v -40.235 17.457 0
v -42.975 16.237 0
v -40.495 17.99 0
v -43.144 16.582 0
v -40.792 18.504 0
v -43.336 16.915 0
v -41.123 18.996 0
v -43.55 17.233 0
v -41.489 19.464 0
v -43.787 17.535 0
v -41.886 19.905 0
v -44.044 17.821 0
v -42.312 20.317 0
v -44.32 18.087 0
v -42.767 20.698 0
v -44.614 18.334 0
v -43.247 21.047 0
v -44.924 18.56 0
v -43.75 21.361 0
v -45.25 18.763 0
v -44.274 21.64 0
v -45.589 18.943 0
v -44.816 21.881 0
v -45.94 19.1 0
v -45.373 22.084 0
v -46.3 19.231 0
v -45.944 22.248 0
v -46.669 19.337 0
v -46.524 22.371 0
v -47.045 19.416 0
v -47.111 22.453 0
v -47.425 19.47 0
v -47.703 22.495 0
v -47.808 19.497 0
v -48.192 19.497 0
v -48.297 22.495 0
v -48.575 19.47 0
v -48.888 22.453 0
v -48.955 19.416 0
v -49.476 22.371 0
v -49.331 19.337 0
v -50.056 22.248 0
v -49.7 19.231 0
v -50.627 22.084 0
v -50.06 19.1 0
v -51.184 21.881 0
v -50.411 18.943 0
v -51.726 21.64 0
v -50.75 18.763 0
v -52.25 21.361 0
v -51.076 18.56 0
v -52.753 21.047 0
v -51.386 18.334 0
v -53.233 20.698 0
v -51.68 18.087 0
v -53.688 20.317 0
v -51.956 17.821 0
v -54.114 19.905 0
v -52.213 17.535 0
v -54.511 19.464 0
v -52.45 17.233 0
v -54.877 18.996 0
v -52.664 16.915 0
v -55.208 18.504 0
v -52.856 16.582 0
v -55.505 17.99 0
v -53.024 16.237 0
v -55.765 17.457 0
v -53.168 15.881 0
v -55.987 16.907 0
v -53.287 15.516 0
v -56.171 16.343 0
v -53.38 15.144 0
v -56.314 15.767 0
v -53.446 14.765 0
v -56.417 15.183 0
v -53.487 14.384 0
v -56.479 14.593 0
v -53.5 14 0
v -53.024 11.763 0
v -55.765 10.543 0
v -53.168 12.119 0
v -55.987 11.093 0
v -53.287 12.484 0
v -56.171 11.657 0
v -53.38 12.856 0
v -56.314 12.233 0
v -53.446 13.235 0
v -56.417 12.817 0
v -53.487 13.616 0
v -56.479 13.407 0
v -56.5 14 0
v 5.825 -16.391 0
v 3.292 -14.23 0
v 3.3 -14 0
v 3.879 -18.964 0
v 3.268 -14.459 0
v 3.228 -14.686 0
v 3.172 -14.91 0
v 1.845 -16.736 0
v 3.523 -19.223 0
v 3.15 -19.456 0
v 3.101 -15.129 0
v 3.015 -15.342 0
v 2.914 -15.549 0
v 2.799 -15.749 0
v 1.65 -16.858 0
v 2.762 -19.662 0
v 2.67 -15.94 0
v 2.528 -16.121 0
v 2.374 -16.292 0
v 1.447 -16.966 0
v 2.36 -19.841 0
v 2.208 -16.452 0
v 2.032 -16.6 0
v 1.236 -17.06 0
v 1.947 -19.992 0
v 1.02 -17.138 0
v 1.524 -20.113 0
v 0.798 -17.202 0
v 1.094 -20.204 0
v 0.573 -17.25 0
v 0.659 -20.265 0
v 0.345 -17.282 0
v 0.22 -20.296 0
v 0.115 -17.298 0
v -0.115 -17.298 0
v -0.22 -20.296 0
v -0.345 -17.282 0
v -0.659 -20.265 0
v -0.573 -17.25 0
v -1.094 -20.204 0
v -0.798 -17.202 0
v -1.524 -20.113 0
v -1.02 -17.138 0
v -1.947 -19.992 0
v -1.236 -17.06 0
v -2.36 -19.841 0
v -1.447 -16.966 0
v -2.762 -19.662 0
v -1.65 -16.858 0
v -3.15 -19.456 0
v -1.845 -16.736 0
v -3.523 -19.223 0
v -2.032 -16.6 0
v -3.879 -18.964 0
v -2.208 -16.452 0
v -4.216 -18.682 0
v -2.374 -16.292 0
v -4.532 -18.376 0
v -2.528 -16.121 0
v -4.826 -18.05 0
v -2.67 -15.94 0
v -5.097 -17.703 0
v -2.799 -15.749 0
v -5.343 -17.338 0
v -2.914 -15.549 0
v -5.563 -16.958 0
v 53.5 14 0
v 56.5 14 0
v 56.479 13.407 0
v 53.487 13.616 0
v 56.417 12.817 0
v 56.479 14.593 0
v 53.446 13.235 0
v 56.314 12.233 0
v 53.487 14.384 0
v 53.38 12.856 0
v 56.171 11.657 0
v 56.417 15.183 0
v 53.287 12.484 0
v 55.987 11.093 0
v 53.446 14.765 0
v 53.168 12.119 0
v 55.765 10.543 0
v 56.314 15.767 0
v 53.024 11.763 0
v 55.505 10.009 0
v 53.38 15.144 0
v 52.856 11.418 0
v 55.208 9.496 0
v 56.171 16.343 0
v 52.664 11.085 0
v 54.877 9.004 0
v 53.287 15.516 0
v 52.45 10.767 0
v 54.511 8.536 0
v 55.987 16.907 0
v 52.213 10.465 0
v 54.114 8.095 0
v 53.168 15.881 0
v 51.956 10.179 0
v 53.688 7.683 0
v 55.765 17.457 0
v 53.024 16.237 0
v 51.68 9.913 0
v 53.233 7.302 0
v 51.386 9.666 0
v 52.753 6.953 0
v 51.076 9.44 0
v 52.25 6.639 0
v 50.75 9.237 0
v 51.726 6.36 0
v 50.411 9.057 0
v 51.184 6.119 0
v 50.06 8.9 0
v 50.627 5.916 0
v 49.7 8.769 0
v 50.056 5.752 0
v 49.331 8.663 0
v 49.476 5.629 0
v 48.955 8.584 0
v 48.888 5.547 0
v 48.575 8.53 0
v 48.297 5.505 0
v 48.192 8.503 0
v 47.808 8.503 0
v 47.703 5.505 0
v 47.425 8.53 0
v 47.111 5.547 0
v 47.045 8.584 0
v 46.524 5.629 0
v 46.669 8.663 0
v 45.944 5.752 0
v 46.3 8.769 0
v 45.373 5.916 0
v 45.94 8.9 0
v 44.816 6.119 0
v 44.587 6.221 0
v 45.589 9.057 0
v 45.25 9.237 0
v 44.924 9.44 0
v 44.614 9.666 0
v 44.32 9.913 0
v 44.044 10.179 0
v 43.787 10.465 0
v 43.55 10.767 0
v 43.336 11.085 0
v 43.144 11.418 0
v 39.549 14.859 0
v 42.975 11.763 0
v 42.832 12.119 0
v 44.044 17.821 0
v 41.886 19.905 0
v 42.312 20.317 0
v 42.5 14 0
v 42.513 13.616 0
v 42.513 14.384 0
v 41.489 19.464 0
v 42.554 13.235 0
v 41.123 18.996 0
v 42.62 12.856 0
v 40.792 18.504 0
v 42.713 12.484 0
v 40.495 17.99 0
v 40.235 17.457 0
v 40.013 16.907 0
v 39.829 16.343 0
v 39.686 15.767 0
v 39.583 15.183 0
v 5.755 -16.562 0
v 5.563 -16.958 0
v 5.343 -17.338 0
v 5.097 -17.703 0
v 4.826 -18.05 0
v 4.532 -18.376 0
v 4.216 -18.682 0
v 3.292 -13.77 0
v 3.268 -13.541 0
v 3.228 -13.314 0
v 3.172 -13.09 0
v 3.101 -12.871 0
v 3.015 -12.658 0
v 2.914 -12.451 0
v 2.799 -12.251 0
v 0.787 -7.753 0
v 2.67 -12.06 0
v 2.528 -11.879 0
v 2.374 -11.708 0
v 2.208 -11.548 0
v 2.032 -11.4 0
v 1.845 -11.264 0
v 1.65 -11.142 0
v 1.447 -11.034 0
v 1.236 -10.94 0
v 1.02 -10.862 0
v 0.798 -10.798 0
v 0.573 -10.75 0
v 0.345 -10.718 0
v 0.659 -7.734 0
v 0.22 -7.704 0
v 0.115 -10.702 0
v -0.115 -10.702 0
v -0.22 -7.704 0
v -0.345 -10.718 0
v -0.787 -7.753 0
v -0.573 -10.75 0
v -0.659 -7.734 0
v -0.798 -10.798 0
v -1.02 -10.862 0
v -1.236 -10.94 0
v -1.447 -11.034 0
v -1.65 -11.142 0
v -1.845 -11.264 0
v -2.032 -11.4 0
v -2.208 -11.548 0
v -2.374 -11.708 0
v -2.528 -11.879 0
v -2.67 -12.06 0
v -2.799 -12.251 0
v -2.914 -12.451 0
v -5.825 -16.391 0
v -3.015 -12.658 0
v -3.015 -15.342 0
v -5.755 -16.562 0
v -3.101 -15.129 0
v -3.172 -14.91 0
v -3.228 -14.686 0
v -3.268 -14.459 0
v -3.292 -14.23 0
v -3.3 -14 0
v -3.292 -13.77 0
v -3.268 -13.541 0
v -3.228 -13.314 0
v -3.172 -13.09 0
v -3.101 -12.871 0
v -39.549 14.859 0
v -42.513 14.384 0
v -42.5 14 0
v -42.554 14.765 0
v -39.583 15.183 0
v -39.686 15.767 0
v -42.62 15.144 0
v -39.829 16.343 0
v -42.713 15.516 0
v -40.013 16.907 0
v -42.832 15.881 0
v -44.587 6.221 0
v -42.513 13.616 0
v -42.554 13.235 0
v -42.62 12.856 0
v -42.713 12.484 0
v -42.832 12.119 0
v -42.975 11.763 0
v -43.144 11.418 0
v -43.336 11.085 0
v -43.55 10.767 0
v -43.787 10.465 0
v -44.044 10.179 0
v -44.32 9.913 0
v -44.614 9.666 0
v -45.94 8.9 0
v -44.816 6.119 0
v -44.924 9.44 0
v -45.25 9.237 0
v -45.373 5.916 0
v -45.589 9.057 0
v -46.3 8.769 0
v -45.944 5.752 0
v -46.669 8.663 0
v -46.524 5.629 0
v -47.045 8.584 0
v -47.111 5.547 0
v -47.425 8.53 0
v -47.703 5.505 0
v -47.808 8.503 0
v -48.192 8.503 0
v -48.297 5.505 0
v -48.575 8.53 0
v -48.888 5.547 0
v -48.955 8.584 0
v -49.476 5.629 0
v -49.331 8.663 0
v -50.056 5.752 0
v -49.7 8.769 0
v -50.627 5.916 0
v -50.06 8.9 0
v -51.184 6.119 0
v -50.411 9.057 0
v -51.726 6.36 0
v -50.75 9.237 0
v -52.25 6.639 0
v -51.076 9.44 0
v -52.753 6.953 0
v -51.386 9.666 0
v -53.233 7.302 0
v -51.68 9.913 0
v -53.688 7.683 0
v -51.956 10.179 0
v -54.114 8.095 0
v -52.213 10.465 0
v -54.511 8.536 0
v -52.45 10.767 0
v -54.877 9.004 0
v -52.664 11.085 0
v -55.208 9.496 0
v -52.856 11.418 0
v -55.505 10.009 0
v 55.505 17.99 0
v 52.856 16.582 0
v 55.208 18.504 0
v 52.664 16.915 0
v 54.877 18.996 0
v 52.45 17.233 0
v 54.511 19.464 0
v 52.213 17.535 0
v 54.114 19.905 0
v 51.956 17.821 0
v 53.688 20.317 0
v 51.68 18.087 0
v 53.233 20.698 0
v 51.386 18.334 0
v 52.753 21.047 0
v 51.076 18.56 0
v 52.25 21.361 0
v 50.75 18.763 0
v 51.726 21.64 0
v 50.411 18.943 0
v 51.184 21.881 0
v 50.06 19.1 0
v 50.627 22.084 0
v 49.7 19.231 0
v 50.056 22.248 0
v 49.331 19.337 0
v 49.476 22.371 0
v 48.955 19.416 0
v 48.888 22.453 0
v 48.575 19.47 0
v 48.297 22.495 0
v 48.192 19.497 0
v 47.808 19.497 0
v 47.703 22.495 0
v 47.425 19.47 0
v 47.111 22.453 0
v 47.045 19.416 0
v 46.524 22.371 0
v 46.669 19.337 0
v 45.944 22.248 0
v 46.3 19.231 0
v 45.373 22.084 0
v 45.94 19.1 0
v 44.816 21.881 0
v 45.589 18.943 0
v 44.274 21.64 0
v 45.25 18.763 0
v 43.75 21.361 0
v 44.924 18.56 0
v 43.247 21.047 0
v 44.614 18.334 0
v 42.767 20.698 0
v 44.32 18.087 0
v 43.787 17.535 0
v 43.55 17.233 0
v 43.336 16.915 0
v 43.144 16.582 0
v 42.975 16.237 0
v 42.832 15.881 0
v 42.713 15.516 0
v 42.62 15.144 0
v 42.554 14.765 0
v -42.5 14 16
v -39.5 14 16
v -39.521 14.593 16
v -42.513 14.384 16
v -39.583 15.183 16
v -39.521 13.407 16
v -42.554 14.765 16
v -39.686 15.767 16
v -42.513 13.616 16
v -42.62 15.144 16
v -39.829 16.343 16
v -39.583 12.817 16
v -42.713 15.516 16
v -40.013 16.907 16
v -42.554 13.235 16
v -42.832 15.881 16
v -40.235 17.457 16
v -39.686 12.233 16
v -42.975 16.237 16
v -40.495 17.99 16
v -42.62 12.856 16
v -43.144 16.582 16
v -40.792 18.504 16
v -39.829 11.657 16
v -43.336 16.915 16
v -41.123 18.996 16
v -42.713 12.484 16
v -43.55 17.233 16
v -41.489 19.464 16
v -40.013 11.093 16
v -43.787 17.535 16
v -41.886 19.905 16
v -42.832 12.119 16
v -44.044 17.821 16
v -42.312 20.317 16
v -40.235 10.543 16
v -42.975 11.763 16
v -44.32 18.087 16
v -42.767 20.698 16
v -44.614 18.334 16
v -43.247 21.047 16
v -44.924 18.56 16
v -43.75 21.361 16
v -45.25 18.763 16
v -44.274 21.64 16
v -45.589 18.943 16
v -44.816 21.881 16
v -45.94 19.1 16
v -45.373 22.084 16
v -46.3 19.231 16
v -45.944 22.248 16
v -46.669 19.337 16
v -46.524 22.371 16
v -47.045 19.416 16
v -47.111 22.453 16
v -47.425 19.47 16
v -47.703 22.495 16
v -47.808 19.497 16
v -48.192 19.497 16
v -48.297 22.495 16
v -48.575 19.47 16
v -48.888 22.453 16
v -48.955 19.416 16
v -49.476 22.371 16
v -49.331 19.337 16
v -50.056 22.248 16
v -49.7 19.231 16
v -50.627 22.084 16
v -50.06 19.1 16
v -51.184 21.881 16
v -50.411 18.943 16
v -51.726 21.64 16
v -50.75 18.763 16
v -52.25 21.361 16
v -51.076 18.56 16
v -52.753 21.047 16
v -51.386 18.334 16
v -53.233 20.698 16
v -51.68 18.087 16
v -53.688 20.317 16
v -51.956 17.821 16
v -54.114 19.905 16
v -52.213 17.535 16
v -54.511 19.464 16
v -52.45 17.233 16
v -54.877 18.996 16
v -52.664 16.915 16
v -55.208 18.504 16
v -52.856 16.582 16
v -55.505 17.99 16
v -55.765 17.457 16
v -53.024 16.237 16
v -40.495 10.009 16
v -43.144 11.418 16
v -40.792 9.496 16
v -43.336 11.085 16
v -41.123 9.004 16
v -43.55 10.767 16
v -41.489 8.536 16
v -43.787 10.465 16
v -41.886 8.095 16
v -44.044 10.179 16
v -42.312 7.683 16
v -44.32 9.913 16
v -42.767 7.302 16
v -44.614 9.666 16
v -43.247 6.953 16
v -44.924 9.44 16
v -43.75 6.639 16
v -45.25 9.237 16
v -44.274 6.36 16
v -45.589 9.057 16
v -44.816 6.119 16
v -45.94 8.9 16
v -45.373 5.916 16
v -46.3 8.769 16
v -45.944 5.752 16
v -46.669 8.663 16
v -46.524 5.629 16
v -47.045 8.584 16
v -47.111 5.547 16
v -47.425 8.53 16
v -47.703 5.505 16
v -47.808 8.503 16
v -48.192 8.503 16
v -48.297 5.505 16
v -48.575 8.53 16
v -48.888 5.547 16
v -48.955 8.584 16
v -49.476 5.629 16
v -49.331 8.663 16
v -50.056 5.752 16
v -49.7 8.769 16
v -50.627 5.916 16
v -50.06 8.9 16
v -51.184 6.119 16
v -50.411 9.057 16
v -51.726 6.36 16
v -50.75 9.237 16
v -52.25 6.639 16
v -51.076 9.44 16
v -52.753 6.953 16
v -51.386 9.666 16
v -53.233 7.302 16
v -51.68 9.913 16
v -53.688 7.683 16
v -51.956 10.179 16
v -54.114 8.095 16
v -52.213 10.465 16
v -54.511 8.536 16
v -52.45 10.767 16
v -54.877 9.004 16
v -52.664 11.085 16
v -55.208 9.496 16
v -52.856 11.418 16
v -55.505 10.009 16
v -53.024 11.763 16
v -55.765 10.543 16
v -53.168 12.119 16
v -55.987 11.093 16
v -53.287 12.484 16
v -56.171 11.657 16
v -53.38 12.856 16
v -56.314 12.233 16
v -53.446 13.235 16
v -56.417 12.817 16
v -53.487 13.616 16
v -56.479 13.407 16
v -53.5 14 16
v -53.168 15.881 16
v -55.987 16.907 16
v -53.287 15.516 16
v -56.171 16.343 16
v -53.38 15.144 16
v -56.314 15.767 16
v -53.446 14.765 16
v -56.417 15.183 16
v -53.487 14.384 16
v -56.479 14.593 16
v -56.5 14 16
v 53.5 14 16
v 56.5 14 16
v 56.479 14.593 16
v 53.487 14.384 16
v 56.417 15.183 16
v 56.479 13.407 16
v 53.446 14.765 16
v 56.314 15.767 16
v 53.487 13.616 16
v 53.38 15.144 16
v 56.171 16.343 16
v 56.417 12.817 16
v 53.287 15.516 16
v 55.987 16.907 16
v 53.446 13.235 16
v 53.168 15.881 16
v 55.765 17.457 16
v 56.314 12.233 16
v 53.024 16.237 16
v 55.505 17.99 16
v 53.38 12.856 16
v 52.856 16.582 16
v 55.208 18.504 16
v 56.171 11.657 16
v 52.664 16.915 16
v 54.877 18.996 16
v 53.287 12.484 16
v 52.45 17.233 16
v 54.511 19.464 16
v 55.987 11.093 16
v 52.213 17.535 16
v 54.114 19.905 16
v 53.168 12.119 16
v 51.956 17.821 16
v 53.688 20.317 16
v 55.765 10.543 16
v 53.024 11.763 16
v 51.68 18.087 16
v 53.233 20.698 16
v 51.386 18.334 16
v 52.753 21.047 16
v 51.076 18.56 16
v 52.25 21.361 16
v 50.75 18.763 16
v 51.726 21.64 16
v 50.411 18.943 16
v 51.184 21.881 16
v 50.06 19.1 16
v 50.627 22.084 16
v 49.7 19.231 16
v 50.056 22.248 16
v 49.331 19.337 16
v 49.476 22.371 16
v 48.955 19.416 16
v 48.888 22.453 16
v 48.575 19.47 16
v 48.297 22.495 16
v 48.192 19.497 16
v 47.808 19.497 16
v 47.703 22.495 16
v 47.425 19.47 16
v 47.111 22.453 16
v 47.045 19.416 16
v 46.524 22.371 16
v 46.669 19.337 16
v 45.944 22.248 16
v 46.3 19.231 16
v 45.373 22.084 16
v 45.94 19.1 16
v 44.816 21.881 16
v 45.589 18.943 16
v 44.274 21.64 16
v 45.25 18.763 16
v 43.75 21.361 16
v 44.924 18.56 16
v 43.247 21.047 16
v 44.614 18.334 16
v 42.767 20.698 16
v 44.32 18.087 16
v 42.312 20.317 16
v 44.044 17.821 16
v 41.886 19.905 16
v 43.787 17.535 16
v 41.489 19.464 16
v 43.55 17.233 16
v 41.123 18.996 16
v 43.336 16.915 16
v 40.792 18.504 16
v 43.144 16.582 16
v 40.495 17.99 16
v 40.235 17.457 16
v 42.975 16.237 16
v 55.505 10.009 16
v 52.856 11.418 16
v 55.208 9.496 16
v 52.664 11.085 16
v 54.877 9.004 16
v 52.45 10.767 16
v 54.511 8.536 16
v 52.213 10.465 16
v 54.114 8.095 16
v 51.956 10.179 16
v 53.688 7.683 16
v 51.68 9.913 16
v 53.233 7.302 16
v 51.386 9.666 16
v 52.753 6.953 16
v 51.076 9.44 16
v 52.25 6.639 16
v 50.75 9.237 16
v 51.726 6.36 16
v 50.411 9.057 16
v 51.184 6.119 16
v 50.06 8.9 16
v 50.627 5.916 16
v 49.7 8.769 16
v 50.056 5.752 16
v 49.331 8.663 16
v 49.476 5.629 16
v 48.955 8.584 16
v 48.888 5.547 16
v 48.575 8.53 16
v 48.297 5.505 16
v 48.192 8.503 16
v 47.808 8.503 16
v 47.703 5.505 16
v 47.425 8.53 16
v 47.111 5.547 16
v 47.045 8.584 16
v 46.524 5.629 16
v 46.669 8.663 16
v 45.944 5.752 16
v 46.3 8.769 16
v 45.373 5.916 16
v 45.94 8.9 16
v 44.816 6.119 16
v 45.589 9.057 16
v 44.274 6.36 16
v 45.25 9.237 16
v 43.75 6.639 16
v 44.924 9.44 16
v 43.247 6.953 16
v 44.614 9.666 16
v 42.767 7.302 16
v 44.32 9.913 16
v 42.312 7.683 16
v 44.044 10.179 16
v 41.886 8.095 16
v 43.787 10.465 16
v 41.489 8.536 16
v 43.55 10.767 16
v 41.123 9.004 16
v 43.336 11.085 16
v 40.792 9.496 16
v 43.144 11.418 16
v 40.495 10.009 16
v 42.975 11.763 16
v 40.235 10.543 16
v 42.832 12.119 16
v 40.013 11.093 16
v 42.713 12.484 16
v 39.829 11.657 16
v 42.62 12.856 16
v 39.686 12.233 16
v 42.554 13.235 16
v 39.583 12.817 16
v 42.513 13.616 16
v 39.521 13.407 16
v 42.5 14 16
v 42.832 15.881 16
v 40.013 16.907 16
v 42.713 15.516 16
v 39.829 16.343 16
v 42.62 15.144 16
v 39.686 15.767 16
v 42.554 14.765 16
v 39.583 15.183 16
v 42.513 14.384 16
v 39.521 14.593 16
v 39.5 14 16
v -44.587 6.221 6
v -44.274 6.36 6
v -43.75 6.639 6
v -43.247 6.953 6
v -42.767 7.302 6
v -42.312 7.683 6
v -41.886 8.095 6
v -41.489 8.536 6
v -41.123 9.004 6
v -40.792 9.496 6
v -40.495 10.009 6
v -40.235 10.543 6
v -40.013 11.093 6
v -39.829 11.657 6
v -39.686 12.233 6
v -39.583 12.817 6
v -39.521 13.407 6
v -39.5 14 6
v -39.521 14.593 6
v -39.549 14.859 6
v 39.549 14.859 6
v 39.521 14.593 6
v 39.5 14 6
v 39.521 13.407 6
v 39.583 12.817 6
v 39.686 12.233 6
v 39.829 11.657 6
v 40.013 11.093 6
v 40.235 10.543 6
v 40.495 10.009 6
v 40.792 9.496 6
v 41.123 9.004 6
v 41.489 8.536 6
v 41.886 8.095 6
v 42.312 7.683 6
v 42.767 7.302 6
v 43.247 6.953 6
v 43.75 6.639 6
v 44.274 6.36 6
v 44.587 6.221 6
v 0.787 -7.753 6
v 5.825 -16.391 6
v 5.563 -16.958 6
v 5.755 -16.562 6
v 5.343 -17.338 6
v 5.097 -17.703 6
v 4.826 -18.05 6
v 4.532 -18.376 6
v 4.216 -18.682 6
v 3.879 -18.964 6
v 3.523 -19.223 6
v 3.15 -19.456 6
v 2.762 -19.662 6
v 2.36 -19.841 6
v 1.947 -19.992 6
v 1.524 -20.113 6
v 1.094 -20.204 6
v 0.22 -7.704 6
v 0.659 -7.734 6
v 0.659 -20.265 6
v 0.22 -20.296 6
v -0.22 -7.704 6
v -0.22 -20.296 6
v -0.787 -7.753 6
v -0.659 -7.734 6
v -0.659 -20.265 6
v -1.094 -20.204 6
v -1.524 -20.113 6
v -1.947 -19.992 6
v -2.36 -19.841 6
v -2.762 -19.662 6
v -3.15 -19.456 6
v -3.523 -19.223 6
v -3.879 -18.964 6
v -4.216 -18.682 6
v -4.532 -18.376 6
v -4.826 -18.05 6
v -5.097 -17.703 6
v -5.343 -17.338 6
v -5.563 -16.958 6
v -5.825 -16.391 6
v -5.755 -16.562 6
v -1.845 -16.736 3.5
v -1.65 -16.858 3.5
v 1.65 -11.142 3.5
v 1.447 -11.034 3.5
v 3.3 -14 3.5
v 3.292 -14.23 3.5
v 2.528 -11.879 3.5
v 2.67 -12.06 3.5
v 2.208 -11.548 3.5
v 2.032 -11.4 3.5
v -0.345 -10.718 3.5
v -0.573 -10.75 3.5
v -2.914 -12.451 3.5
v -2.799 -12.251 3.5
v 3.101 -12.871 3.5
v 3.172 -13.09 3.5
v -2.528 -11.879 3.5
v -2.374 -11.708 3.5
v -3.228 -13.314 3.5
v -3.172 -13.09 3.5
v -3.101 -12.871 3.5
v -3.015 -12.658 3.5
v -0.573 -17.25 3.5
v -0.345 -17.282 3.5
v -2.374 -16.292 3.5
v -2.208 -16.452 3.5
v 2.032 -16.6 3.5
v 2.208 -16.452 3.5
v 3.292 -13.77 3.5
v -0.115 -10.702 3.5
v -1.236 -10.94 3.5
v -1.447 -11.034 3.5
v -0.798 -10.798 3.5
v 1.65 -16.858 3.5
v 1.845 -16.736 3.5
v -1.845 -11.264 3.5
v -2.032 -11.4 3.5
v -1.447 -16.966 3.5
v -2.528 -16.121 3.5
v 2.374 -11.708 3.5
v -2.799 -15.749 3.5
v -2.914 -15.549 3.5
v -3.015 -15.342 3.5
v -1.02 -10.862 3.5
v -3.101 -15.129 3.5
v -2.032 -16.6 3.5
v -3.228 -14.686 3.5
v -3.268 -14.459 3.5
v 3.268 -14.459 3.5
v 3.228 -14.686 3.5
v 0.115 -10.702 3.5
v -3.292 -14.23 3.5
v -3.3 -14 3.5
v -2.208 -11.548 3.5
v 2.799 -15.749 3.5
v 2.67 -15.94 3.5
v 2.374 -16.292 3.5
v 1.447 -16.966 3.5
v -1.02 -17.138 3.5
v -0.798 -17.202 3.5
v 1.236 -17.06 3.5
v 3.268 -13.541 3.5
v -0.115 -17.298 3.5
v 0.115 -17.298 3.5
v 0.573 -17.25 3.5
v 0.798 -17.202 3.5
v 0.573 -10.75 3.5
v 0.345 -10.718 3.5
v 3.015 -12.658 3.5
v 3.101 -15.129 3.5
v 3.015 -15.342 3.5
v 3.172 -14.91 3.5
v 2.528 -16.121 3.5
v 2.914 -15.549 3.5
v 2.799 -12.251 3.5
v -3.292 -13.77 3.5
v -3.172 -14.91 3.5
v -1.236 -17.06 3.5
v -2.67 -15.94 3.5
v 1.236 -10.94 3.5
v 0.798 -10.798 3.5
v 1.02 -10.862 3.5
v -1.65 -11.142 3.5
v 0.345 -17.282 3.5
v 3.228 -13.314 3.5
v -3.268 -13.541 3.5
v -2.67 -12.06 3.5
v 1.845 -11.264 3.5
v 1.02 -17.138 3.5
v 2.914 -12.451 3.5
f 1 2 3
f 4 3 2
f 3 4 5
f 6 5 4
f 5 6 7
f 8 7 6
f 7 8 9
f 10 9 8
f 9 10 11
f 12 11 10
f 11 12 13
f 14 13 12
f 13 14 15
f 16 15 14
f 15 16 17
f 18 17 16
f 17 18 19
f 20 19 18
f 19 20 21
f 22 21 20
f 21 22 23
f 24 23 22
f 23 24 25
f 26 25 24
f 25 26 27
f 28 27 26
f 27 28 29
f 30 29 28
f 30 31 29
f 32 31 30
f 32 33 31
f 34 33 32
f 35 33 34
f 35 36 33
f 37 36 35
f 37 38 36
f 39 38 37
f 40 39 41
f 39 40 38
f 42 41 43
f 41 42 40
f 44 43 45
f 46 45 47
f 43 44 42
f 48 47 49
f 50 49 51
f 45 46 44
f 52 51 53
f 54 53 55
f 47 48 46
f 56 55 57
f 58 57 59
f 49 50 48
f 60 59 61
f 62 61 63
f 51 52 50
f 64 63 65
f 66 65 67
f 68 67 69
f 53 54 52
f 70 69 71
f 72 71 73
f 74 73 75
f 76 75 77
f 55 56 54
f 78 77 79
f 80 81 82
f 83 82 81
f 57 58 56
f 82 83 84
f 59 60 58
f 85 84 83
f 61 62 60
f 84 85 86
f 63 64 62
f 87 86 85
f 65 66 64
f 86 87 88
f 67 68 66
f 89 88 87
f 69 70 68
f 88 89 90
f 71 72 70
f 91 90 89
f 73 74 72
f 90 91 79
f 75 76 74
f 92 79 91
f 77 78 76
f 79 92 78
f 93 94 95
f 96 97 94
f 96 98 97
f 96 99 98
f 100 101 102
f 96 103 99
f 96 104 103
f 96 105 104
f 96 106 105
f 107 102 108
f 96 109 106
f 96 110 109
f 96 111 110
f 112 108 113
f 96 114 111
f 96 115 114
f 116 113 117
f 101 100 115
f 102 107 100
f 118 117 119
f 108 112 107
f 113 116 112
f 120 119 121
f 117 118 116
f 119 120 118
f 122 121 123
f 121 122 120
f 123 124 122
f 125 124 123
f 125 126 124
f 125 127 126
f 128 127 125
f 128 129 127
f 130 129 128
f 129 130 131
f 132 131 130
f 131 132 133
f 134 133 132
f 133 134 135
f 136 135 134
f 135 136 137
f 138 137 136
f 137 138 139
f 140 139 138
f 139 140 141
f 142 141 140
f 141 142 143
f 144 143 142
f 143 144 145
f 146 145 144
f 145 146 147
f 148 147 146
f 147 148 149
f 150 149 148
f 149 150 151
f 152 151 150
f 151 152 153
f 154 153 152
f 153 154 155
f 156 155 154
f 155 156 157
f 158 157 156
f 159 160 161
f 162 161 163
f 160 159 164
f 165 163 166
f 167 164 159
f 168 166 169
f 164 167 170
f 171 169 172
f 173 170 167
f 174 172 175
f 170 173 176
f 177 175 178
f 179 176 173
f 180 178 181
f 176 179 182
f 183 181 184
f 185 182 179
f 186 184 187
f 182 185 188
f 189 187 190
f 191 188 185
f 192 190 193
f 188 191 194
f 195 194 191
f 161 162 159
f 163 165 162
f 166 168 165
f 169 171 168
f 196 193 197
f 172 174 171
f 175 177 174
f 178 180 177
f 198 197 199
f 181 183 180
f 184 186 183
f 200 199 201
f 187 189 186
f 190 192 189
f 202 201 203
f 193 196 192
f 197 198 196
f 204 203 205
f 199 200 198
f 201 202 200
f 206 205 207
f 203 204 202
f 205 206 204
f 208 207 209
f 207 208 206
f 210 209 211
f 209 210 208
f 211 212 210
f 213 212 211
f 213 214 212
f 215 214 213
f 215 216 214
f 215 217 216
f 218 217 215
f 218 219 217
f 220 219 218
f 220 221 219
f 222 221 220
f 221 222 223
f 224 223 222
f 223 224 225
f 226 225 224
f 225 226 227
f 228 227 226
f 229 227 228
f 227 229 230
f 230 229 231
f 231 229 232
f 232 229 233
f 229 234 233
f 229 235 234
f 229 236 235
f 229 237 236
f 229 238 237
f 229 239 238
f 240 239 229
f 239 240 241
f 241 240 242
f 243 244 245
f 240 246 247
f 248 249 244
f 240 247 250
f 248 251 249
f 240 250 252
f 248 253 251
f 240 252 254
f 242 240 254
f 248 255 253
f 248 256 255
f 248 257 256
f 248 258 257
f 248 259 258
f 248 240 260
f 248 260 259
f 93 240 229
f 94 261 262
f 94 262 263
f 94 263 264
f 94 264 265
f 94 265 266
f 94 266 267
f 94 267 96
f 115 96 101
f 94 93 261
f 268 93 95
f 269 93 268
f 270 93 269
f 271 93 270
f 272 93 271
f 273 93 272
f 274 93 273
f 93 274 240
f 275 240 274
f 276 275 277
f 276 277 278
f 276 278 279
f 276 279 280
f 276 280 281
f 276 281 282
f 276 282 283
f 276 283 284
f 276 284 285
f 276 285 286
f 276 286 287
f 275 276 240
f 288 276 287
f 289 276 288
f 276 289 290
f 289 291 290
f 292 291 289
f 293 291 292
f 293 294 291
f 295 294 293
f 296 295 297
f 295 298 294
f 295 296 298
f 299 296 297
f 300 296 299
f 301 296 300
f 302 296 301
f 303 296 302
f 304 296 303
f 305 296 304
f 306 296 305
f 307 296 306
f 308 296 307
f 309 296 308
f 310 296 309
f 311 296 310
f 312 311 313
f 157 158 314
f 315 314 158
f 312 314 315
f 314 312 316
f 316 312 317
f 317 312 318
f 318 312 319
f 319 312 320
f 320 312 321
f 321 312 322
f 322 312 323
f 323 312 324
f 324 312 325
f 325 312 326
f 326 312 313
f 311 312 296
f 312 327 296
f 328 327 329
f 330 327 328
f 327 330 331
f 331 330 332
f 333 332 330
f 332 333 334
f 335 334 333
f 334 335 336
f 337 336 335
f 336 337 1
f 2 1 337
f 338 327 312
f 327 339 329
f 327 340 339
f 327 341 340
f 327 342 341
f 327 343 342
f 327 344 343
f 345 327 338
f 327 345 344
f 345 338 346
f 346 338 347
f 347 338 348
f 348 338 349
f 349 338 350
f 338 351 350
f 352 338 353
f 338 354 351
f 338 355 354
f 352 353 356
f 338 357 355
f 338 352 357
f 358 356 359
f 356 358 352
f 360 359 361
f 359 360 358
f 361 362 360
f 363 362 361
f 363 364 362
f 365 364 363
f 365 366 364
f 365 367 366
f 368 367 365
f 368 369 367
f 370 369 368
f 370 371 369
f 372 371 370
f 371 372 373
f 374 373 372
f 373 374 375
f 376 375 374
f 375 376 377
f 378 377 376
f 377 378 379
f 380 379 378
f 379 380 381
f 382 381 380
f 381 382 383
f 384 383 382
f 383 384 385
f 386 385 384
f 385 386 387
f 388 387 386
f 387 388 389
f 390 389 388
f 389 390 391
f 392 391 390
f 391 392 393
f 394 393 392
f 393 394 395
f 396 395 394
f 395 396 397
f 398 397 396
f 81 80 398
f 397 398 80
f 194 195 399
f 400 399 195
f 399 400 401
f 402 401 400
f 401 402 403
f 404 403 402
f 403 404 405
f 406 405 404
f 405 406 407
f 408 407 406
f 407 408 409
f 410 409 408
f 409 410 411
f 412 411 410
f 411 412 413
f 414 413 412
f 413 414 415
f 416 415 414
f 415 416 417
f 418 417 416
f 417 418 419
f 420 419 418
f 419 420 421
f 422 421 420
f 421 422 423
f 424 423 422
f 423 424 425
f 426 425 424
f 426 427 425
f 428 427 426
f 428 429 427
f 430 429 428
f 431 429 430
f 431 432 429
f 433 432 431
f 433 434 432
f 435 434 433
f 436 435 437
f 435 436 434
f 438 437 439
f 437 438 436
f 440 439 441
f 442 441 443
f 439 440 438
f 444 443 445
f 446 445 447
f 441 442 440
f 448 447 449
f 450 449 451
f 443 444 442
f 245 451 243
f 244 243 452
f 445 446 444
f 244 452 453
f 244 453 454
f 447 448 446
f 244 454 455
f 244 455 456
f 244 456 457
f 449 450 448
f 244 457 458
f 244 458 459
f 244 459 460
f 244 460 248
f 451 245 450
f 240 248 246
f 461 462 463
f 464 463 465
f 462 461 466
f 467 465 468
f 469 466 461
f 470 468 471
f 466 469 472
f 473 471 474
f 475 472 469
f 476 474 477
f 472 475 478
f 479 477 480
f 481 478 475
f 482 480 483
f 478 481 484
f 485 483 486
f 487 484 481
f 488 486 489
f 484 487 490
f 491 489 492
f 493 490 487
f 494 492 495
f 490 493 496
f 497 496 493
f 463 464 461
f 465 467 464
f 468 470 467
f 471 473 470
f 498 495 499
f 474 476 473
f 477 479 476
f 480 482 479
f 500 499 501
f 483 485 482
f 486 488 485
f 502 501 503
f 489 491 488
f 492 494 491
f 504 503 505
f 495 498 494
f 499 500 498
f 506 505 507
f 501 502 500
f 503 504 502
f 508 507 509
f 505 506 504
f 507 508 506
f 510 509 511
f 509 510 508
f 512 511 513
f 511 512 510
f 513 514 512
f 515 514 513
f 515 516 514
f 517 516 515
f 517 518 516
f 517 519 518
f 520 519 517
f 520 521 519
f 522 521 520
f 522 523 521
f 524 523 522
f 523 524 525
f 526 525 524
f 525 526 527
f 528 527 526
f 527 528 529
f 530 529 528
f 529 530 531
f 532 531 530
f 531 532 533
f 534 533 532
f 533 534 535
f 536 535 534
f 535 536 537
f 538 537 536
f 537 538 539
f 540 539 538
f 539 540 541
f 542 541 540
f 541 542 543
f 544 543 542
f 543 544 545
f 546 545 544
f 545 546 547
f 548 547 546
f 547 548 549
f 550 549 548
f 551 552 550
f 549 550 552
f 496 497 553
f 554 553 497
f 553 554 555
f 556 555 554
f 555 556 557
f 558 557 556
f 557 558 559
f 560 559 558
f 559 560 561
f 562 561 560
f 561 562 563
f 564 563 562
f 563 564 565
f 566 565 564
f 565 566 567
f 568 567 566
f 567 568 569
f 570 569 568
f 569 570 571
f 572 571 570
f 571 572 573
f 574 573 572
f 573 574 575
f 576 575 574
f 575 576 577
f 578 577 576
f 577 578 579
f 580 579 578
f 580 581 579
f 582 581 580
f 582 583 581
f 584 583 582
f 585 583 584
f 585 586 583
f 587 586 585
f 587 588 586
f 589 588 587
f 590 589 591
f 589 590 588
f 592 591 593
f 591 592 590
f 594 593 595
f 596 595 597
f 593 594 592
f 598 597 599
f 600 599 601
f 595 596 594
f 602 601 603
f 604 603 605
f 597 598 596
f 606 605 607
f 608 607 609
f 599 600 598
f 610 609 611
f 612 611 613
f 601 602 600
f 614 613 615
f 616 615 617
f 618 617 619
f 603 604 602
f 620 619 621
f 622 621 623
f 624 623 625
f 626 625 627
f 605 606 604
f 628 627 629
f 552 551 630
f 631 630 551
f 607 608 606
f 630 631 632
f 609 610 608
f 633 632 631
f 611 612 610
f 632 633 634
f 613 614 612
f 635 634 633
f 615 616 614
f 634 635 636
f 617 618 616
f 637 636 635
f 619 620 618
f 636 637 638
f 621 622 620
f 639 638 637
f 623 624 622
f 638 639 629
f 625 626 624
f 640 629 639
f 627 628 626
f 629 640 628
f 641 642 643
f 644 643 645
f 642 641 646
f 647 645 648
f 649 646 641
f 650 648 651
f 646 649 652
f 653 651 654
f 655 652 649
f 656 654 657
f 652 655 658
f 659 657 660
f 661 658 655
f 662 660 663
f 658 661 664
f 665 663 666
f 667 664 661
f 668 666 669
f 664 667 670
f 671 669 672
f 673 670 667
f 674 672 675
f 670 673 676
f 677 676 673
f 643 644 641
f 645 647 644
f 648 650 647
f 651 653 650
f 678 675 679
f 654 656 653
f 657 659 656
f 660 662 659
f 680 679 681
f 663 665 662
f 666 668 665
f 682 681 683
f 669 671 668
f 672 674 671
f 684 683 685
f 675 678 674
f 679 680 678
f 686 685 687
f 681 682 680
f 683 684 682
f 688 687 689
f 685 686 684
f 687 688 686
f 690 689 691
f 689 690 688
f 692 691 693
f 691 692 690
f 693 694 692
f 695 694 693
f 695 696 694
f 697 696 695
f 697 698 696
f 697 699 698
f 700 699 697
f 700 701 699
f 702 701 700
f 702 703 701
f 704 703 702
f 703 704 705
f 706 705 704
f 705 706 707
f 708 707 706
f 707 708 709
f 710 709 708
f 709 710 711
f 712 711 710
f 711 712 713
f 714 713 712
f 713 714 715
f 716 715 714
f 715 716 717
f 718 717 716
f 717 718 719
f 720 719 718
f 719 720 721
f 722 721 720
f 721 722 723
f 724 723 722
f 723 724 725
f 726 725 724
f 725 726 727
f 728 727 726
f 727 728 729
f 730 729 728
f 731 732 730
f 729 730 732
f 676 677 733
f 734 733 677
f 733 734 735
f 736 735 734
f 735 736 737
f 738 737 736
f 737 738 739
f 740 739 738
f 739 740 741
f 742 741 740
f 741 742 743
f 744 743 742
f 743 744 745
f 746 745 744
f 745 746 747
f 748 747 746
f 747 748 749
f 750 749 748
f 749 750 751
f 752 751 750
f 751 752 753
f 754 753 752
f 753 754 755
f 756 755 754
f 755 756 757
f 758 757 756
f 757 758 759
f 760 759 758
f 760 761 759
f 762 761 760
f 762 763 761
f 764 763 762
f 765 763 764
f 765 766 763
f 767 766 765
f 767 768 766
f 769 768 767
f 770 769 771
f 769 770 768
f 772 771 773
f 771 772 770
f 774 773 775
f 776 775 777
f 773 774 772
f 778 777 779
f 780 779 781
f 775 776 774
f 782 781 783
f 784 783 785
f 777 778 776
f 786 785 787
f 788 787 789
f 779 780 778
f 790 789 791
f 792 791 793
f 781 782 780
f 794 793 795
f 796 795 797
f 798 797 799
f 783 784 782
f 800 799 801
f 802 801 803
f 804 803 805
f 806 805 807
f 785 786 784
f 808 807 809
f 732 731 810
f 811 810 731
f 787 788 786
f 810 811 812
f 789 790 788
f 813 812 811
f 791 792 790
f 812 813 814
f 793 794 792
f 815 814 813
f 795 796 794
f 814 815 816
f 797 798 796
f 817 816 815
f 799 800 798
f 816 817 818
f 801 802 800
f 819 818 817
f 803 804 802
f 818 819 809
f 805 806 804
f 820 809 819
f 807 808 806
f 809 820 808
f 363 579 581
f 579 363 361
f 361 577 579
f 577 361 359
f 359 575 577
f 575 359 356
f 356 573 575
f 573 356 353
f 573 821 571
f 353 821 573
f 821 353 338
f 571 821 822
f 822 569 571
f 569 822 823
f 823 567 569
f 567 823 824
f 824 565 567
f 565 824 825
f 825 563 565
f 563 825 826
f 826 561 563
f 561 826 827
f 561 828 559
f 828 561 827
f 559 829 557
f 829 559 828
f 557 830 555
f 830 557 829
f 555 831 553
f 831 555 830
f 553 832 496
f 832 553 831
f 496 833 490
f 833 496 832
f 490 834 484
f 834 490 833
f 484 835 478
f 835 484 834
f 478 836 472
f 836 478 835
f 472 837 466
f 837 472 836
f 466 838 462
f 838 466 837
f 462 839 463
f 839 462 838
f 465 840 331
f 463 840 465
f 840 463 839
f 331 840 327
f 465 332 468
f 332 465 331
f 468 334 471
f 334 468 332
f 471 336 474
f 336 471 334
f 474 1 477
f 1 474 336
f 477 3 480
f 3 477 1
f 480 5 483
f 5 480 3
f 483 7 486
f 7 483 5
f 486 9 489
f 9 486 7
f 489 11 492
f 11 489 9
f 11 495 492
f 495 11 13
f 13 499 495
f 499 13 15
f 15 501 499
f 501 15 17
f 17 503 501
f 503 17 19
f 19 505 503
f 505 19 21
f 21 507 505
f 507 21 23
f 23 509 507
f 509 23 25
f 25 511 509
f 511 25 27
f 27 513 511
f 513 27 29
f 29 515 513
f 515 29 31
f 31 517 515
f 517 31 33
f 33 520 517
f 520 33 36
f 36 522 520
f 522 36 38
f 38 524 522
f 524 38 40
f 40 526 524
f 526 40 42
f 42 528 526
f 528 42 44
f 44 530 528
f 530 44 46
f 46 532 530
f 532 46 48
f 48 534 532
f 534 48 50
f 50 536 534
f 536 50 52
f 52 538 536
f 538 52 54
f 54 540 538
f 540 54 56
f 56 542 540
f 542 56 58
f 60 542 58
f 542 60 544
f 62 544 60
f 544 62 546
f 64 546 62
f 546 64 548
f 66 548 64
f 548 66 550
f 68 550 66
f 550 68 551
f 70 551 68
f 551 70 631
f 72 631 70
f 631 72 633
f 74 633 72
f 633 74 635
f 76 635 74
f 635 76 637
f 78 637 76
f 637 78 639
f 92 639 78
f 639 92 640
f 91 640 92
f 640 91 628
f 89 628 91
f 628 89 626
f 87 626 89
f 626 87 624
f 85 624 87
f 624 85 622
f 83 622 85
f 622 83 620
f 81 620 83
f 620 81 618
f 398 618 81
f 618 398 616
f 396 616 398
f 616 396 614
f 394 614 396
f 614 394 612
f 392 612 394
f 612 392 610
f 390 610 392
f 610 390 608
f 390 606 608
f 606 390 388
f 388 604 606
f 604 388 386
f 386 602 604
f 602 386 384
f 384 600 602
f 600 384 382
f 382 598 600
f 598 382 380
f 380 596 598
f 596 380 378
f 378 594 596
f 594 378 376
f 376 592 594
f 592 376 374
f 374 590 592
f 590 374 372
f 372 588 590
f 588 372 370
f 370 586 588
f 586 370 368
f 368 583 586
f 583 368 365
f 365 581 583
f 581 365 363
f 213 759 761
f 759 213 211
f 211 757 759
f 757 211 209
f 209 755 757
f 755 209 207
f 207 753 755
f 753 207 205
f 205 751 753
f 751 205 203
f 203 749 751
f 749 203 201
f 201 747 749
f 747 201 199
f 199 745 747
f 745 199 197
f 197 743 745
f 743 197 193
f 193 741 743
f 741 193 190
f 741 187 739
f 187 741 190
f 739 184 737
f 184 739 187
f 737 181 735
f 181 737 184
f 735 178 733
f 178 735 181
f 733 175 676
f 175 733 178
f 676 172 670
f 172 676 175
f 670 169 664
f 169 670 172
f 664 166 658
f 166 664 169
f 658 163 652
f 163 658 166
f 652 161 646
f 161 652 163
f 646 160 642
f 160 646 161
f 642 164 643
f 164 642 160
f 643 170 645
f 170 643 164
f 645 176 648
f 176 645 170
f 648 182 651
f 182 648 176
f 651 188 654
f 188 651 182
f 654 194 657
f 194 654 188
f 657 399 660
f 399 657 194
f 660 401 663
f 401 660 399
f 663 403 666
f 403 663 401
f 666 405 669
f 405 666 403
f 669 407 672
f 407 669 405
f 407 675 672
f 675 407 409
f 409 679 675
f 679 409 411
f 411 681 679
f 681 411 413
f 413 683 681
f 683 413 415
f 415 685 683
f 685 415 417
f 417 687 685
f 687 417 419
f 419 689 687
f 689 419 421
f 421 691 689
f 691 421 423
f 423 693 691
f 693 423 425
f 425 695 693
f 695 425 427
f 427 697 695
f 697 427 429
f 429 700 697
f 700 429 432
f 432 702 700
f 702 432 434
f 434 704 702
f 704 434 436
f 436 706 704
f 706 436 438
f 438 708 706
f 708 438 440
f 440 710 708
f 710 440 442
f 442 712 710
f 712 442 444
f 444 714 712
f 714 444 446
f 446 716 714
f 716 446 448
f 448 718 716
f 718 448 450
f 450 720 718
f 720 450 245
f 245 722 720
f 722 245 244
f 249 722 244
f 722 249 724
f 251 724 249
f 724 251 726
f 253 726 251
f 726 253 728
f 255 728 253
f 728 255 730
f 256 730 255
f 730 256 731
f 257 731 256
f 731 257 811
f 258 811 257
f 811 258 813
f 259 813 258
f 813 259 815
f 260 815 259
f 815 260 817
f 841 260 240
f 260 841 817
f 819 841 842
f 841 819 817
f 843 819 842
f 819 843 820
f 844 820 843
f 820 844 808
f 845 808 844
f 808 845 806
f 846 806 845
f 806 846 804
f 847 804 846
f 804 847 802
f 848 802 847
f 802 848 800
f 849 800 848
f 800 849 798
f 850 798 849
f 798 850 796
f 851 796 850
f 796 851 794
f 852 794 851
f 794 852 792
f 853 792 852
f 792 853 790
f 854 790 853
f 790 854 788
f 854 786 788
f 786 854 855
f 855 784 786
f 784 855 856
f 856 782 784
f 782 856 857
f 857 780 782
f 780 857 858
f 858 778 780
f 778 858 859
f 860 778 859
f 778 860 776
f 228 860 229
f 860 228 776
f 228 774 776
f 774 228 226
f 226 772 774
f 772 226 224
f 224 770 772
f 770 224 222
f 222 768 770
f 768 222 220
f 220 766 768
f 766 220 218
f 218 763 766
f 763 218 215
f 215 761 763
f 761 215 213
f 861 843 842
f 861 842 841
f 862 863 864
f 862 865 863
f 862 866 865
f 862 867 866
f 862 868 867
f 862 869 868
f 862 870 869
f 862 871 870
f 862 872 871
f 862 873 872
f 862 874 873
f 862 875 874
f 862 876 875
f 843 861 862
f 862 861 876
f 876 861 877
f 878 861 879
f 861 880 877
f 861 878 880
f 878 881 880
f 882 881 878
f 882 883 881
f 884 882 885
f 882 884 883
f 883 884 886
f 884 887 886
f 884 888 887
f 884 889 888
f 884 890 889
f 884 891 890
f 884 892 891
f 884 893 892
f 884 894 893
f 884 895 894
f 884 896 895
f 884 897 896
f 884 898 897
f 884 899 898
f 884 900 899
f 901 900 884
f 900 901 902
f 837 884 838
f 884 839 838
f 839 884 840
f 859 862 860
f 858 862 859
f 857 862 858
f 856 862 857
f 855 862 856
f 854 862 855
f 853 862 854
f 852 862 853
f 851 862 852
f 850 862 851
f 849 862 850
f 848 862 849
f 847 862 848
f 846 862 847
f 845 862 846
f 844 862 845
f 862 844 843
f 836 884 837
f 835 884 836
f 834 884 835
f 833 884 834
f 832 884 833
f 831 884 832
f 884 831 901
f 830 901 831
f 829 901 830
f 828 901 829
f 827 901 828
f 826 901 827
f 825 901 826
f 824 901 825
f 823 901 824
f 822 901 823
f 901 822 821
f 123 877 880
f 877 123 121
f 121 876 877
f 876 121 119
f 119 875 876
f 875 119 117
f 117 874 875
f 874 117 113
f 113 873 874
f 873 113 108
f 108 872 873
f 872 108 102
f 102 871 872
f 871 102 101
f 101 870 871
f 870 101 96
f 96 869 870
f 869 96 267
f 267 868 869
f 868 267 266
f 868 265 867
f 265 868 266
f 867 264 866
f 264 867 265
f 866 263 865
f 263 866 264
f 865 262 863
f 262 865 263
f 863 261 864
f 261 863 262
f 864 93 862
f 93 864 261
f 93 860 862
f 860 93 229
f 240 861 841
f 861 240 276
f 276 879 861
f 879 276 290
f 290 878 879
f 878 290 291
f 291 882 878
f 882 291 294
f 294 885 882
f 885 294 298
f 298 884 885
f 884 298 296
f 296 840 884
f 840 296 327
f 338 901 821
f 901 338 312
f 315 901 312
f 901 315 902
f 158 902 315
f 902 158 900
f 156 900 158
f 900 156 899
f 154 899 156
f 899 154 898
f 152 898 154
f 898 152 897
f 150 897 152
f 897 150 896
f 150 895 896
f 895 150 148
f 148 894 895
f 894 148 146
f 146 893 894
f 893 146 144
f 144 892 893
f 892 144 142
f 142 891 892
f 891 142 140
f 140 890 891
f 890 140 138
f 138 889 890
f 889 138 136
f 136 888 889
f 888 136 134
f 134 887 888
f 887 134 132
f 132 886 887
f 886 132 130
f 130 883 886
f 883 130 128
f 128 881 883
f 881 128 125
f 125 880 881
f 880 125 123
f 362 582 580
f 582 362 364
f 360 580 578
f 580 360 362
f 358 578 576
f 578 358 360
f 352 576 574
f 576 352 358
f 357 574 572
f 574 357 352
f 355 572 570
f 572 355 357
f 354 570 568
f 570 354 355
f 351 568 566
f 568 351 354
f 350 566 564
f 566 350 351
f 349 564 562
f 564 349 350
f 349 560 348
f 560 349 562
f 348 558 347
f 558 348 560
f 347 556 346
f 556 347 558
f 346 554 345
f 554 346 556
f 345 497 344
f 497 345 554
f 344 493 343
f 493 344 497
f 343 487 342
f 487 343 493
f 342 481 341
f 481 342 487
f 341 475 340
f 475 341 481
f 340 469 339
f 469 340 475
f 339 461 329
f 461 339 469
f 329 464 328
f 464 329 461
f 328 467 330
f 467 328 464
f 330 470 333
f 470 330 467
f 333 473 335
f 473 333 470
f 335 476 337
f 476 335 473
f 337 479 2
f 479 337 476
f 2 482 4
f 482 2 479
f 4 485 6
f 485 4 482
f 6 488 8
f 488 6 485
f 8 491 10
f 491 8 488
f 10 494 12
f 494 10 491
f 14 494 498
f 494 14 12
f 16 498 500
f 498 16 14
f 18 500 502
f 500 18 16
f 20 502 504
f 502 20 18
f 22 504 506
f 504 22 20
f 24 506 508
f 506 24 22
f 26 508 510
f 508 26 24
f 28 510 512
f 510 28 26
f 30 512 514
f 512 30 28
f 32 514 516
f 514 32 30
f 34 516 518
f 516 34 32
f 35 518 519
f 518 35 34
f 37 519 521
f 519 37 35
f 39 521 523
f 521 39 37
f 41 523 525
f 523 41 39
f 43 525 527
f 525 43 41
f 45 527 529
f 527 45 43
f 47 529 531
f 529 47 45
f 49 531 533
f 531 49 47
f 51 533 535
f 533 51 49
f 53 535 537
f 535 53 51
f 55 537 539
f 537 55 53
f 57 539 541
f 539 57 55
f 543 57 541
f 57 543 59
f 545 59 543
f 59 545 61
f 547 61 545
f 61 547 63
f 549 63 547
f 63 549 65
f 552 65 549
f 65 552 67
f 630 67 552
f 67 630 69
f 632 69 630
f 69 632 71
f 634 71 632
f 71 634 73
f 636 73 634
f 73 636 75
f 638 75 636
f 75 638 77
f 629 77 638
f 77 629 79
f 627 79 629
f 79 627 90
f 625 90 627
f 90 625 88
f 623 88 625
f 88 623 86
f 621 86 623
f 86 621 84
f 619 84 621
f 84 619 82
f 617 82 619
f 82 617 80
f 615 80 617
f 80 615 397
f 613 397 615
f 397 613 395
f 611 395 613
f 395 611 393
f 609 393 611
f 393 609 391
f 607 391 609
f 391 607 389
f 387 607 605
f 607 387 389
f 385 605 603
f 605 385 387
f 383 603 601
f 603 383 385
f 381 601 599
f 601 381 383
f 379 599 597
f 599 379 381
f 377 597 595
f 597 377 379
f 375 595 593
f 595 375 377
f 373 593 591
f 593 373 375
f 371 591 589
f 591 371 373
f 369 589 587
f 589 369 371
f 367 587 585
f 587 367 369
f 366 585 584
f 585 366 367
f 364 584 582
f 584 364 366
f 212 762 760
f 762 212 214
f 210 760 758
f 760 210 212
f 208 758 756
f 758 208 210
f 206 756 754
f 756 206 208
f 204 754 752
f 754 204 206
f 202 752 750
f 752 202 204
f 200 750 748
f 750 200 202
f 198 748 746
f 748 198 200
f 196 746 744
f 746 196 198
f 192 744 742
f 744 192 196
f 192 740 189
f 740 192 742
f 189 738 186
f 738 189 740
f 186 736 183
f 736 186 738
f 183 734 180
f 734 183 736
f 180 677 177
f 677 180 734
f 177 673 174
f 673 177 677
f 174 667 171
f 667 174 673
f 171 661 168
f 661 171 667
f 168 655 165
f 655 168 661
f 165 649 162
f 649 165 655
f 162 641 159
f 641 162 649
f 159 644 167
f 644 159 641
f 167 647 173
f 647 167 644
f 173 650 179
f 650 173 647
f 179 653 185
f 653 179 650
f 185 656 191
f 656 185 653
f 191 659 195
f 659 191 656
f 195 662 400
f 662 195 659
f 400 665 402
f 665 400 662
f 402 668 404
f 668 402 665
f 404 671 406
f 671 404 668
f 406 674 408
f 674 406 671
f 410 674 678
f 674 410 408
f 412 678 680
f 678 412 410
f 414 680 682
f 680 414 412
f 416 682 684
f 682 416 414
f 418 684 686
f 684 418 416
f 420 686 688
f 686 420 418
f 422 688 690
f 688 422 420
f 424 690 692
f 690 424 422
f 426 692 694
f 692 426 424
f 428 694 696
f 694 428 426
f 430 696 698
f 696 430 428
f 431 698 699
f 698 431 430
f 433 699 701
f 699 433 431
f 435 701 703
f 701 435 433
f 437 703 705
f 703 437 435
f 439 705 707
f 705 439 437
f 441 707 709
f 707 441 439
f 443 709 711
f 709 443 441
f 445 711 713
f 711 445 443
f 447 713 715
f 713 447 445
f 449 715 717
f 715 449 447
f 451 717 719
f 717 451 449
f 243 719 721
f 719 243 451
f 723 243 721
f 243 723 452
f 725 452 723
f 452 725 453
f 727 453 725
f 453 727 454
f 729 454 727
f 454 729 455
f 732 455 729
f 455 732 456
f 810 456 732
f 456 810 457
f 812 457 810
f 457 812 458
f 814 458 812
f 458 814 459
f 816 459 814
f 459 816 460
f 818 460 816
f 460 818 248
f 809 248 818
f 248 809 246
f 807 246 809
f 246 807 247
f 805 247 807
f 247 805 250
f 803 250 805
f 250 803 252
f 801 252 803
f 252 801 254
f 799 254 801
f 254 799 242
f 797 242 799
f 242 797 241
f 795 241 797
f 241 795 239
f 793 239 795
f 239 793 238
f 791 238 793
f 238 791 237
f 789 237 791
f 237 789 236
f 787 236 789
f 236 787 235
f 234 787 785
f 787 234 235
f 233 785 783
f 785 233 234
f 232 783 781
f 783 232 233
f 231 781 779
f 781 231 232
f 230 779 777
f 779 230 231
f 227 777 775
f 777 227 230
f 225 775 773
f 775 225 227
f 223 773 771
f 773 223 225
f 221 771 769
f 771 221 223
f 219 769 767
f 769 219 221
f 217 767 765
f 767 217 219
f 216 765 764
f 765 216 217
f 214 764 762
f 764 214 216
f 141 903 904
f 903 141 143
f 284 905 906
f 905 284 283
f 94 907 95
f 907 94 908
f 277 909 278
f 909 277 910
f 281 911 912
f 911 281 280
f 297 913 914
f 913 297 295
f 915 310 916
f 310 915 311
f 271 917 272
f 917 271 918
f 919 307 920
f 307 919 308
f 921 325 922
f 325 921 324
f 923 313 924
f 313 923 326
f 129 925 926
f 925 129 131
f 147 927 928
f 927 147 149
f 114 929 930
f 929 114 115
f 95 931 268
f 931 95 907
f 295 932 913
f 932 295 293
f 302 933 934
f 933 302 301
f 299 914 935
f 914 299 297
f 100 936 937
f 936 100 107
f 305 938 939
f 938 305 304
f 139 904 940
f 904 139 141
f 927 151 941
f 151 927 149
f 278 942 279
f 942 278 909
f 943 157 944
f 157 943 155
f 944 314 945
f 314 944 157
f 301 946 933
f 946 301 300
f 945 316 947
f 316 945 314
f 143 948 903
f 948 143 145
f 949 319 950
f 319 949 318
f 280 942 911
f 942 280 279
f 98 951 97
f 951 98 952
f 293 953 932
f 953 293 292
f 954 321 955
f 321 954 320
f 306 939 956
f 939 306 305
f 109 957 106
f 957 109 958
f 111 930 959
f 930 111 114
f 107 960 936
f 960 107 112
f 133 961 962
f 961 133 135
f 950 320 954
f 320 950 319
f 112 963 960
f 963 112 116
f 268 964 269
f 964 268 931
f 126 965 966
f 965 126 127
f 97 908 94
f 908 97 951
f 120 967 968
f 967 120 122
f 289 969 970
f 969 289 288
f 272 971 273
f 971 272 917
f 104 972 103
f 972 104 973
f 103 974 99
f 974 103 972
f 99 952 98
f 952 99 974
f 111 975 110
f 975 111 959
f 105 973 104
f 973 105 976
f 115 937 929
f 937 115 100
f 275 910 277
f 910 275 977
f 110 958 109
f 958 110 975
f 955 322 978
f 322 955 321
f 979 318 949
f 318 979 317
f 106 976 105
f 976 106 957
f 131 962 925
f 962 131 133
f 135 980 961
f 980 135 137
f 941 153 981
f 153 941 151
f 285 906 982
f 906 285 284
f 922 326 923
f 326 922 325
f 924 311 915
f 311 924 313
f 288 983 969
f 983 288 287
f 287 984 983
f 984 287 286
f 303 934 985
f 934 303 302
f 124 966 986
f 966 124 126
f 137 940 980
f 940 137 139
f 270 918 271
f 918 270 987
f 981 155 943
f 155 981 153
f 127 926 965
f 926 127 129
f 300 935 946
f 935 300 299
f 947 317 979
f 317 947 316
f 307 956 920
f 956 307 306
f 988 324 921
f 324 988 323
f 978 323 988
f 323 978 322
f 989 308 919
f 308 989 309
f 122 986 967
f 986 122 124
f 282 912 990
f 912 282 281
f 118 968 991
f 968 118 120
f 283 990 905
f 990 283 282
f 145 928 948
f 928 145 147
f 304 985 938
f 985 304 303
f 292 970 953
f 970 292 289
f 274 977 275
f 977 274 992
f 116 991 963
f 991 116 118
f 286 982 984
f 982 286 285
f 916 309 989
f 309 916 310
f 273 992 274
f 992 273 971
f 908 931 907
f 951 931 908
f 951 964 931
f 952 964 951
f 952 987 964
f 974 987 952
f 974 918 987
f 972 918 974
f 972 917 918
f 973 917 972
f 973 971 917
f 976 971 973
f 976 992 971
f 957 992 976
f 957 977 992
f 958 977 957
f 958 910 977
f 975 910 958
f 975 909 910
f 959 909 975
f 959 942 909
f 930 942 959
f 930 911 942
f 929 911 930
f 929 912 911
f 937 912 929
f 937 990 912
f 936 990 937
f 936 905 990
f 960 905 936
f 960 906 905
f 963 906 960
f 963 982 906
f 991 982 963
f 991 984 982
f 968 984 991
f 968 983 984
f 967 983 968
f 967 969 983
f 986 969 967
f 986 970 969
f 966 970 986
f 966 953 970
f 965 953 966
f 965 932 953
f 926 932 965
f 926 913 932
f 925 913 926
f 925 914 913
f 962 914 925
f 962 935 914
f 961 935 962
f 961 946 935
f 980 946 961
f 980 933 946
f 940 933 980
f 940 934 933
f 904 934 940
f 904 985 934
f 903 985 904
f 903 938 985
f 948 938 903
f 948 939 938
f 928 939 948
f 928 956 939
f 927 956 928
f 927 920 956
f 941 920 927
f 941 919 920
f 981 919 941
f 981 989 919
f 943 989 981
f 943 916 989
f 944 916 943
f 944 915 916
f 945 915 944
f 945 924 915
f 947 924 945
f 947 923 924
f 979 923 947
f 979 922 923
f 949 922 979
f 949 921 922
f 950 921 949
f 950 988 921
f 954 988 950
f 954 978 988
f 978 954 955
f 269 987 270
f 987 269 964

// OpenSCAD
//OpenSCAD!
// title      : Repligreater Magnet Handle Mount for Qidi Tech I
// author     : Stuart P. Bentley (@stuartpb)
// version    : 1.0.0
// file       : handle-magnet.scad

/* [Measurements] */

// The length of the handle, measured as the distance between
// the centers of the screw-holes.
// (Protip: you can calculate this by measuring the outer width
// and subtracting the gauge/width of the handle.)
distanceBetweenCenters = 96;

// The diameter of the handle (default: 10mm + 1mm tolerance).
rodDiameter = 11; // 

// The diameter of the magnet (default: 6mm + .6mm tolerance).
magnetDiameter = 6.6;

// The depth of the magnet (default: 3mm + .5mm tolerance).
magnetDepth = 3.5;

// The distance from the handle (measured from the center)
// to the place on the frame where the magnet will go.
distanceToFrame = 28;

/* [Parameters] */

// The radius of the material surrounding the handle and magnet.
holderWidth = 3;

// The width of the arms that extend to the magnet.
armWidth = 10;

// The depth of the arms and magnet holder.
holderDepth = 6;

// The length of the handle-grabbing cylinders.
handleGrab = 16;

/* [Tweaks] */

// Circle resolution
$fn = 90;

/* [Hidden] */

// Pythagorean theorem for finding length by X and Y distances.
function hypotenuse(a, b) = sqrt(a*a + b*b);

// Angle from handle rods to magnet
angle = atan2(-distanceToFrame, distanceBetweenCenters/2);
// Length of arms
armLength = hypotenuse(distanceToFrame, distanceBetweenCenters/2);
// Width of handle-holding cylinders
grabWidth = rodDiameter + holderWidth*2;

// Model
difference () {
  
  // Material
  union () {
    
    // Handle-grabbing cylinders
    linear_extrude(handleGrab) {
      // left cylinder
      translate([-distanceBetweenCenters/2, distanceToFrame/2])
        circle(d = grabWidth);
      // right cylinder
      translate([distanceBetweenCenters/2, distanceToFrame/2])
        circle(d = grabWidth);
    }
    
    // Arms / magnet holder
    linear_extrude(holderDepth) {
      // left arm
      translate([-distanceBetweenCenters/2, distanceToFrame/2])
        rotate([0,0, angle]) translate([0, -armWidth/2])
        square([armLength, armWidth]);
      // right arm
      translate([distanceBetweenCenters/2, distanceToFrame/2])
        rotate([0,0, 180-angle]) translate([0, -armWidth/2])
        square([armLength, armWidth]);
      // magnet holder
      translate([0, -distanceToFrame/2])
        circle(d = magnetDiameter + holderWidth*2);
    }
  }
  
  // Handle holes
  linear_extrude(handleGrab) {
    // left hole
    translate([-distanceBetweenCenters/2, distanceToFrame/2])
      circle(d = rodDiameter);
    // right hole
    translate([distanceBetweenCenters/2, distanceToFrame/2])
      circle(d = rodDiameter);
  }
  
  // Magnet slot
  linear_extrude(magnetDepth) {
    translate([0, -distanceToFrame/2])
      circle(d = magnetDiameter);
  }
}
